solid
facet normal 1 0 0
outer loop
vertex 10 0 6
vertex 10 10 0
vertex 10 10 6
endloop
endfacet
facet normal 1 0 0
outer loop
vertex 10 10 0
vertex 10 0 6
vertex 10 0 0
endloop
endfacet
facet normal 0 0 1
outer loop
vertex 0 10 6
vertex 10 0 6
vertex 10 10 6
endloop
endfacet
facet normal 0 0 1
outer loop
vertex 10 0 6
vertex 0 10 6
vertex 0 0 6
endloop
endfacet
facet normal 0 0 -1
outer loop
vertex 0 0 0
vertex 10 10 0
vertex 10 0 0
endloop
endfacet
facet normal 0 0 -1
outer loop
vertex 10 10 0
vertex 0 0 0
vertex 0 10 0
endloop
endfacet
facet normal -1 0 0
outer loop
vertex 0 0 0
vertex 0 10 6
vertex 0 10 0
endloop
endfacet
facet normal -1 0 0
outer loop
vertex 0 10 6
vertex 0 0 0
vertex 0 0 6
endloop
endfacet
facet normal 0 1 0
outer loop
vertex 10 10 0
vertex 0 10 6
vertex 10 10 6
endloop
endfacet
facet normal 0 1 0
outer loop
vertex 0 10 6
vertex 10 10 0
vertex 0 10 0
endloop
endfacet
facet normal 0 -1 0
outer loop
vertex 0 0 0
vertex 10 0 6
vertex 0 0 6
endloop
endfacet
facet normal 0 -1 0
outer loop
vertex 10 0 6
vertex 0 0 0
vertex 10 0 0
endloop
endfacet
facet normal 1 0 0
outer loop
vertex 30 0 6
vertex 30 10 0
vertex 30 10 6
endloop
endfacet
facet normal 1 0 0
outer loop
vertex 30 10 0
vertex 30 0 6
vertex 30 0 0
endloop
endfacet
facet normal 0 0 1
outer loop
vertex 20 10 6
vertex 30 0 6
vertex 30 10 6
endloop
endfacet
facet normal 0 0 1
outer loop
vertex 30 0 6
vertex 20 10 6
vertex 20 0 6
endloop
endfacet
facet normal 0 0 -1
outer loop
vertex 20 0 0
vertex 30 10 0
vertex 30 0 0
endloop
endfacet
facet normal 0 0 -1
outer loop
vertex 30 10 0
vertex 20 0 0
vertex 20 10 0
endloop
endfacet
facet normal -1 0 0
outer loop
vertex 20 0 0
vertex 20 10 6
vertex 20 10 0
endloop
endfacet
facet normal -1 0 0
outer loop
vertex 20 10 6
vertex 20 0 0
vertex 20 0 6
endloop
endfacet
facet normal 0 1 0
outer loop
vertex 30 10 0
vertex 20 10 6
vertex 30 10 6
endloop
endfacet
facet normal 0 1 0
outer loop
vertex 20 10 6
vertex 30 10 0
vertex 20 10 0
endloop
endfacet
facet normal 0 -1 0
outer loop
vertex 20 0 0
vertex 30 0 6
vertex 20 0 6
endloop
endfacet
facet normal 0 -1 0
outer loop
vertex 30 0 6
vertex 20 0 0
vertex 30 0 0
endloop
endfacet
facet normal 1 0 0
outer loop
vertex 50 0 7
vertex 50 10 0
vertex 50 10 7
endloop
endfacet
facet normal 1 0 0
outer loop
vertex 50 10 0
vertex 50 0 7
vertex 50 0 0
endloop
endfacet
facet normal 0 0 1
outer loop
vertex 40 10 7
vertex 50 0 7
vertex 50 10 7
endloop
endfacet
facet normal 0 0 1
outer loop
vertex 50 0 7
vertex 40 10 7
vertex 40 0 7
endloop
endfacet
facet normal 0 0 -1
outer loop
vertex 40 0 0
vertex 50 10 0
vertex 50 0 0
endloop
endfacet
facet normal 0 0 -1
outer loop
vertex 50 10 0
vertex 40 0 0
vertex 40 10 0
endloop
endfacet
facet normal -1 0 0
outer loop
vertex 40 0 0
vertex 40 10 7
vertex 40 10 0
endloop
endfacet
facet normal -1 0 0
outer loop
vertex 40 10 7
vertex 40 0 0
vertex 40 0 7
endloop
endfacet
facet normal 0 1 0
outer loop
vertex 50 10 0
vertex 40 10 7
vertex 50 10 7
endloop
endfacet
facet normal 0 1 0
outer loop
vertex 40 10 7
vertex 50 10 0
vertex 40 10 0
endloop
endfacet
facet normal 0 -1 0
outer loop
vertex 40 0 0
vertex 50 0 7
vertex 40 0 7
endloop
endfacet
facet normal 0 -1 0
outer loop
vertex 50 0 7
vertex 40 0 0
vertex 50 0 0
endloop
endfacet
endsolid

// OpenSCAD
// `round()` on a negative half, which is the one place JavaScript's rounding and
// C's disagree — and the only exercise this corpus has of ANY math builtin
// except `sqrt`.
//
// WHAT IT WOULD CATCH. `Math.round` rounds a half toward +infinity
// (`round(-0.5)` is `-0`); C's `round()`, which OpenSCAD calls, rounds a half
// AWAY FROM ZERO (`round(-0.5)` is `-1`). The three heights below are 6, 6 and 7
// in OpenSCAD and were 10, 8 and 8 here. The standard `round(-x/2)` centring
// idiom is therefore a full millimetre out **on the negative side only**, which
// is why nobody notices: the same expression is exact on the positive side.
//
// WHY IT WAS CHOSEN. `scad.ts` implements 23 math builtins and the corpus called
// exactly one of them (`sqrt`, in `variables_expr`). Rather than 23 thin cases,
// this is the one whose defect is a REAL NUMBER OF MILLIMETRES rather than a
// type error — a wrong `len()` or `norm()` fails loudly, a wrong `round()`
// produces a plausible part of the wrong size.
//
// ⚠ THE MAGNITUDES ARE DELIBERATE. `-0.5`, `-1.5` and `-2.5` are the halves at
// three different exponents; a rounding rule that special-cased one of them
// would still be caught by the other two.
//
// Decidability: three 10 mm-square footprints at x = 0, 20, 40. No two bounding
// boxes can touch at any of the heights either implementation produces.
//
// PLANTED AND WATCHED RED (throwaway copy, openscad 2026.08.07):
//   · `Math.round(x)` in place of `sign(x) * round(abs(x))` -> DIVERGES
translate([ 0, 0, 0]) cube([10, 10, 10 + round(-0.5) * 4]);
translate([20, 0, 0]) cube([10, 10, 10 + round(-1.5) * 2]);
translate([40, 0, 0]) cube([10, 10, 10 + round(-2.5)]);
